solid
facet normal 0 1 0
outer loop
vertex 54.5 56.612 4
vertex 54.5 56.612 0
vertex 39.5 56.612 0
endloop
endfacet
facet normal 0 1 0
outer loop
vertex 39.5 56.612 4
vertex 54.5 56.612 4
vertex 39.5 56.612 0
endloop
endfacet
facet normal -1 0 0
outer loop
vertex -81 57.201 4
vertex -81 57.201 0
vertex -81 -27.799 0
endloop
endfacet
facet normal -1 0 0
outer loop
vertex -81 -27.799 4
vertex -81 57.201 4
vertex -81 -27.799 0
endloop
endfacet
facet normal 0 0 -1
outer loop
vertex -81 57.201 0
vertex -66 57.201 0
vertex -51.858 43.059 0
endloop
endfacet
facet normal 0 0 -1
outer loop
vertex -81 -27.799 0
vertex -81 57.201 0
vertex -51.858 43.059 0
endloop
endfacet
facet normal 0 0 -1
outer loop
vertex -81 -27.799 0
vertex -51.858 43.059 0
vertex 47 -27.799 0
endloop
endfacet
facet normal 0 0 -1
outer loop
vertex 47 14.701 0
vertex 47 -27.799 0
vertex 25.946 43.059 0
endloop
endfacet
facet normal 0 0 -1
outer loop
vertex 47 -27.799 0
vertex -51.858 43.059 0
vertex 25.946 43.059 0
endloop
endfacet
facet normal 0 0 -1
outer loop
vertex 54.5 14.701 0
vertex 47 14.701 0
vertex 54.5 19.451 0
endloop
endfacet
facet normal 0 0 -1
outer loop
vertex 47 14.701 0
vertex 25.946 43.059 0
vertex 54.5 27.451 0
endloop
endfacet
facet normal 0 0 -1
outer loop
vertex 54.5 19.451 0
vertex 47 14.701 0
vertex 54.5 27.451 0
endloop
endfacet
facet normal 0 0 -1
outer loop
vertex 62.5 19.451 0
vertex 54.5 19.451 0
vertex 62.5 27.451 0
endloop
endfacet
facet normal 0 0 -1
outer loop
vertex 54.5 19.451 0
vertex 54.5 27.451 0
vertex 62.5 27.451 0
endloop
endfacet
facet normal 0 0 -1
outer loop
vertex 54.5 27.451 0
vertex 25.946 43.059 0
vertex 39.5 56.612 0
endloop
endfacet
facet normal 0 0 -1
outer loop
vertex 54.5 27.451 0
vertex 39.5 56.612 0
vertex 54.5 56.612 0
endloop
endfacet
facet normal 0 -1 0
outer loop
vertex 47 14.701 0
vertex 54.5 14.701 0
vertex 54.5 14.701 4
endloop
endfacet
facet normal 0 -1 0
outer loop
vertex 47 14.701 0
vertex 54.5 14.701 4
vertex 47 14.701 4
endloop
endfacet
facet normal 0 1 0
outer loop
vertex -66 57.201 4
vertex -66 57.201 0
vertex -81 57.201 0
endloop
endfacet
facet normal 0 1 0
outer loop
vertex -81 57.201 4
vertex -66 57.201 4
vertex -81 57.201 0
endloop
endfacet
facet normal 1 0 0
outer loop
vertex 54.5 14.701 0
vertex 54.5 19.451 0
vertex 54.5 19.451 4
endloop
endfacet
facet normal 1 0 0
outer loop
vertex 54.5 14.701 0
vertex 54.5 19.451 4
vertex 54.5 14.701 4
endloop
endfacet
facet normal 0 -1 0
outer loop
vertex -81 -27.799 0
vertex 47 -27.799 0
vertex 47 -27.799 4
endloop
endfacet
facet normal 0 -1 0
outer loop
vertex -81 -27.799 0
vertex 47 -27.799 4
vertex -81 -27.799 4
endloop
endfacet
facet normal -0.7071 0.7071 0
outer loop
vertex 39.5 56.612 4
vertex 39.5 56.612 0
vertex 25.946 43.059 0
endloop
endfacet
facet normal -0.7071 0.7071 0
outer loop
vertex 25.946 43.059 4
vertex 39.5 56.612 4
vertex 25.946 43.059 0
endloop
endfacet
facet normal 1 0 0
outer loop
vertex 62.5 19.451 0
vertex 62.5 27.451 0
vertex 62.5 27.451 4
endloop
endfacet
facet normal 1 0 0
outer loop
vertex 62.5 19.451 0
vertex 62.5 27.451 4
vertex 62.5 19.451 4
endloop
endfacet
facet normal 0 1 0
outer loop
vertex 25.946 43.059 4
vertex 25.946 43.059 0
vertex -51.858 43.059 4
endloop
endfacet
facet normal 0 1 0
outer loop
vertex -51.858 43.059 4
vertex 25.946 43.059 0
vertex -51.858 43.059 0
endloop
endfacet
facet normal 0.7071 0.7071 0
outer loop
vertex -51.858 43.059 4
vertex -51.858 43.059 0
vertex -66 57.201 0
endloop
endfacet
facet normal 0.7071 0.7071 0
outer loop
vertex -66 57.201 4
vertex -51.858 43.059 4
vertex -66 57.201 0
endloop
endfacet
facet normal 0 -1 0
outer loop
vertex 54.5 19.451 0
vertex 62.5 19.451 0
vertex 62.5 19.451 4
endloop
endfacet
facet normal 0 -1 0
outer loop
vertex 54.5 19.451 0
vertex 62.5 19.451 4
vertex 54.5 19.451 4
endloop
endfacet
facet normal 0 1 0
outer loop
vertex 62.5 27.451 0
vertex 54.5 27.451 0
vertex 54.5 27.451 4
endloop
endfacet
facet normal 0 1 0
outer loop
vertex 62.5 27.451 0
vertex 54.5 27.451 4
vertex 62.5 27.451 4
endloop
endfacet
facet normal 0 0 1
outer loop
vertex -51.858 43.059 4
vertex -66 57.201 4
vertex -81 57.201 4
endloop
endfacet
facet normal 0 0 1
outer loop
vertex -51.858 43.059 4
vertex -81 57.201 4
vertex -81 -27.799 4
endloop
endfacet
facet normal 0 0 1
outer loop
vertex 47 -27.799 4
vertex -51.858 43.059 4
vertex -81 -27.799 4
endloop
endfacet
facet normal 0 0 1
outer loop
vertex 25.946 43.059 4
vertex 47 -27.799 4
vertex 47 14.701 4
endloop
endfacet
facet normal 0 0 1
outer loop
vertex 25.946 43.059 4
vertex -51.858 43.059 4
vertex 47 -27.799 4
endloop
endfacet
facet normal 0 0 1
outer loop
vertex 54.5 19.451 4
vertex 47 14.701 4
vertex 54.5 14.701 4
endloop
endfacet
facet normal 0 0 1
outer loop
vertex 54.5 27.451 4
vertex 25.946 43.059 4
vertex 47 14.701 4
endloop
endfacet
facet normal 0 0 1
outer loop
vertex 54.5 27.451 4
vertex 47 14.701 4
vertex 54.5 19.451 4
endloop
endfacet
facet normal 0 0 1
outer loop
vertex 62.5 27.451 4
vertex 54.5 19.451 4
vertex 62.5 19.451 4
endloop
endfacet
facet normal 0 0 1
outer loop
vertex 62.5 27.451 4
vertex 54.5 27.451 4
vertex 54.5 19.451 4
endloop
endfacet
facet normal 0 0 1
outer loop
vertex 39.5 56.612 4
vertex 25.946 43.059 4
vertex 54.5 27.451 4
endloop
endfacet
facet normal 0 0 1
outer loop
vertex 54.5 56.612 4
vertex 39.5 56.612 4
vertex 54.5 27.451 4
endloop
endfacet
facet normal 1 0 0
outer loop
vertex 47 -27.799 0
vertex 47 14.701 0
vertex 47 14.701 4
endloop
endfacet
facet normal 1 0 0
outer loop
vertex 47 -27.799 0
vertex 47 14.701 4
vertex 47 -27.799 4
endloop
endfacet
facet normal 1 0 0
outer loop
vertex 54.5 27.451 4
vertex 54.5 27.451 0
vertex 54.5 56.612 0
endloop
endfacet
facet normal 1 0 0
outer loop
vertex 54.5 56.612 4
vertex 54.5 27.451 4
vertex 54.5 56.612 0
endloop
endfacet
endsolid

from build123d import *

# Parameters (mm, degrees)
BOSS_EXTRUDE1_DEPTH = 4
BOSS_EXTRUDE2_DEPTH = 4


with BuildPart() as part:
    # Sketch1 → Boss-Extrude1 (new body)
    with BuildSketch(Plane.XY):
        Polygon((47, 32.200893004), (54.5, 32.200893004), (54.5, 27.450893004), (62.5, 27.450893004), (62.5, 19.450893004), (54.5, 19.450893004), (54.5, 14.700893004), (47, 14.700893004), (47, -27.799106996), (-81, -27.799106996), (-81, 32.200893004), align=None)
    extrude(amount=BOSS_EXTRUDE1_DEPTH)

    # Sketch2 → Boss-Extrude2 (add)
    with BuildSketch(Plane.XY):
        Polygon((-81, 32.200893004), (54.5, 32.200893004), (54.5, 56.612431949), (39.5, 56.612431949), (25.946325432, 43.058757381), (-51.857864376, 43.058757381), (-66, 57.200893004), (-81, 57.200893004), align=None)
    extrude(amount=BOSS_EXTRUDE2_DEPTH)


solid = part.part
